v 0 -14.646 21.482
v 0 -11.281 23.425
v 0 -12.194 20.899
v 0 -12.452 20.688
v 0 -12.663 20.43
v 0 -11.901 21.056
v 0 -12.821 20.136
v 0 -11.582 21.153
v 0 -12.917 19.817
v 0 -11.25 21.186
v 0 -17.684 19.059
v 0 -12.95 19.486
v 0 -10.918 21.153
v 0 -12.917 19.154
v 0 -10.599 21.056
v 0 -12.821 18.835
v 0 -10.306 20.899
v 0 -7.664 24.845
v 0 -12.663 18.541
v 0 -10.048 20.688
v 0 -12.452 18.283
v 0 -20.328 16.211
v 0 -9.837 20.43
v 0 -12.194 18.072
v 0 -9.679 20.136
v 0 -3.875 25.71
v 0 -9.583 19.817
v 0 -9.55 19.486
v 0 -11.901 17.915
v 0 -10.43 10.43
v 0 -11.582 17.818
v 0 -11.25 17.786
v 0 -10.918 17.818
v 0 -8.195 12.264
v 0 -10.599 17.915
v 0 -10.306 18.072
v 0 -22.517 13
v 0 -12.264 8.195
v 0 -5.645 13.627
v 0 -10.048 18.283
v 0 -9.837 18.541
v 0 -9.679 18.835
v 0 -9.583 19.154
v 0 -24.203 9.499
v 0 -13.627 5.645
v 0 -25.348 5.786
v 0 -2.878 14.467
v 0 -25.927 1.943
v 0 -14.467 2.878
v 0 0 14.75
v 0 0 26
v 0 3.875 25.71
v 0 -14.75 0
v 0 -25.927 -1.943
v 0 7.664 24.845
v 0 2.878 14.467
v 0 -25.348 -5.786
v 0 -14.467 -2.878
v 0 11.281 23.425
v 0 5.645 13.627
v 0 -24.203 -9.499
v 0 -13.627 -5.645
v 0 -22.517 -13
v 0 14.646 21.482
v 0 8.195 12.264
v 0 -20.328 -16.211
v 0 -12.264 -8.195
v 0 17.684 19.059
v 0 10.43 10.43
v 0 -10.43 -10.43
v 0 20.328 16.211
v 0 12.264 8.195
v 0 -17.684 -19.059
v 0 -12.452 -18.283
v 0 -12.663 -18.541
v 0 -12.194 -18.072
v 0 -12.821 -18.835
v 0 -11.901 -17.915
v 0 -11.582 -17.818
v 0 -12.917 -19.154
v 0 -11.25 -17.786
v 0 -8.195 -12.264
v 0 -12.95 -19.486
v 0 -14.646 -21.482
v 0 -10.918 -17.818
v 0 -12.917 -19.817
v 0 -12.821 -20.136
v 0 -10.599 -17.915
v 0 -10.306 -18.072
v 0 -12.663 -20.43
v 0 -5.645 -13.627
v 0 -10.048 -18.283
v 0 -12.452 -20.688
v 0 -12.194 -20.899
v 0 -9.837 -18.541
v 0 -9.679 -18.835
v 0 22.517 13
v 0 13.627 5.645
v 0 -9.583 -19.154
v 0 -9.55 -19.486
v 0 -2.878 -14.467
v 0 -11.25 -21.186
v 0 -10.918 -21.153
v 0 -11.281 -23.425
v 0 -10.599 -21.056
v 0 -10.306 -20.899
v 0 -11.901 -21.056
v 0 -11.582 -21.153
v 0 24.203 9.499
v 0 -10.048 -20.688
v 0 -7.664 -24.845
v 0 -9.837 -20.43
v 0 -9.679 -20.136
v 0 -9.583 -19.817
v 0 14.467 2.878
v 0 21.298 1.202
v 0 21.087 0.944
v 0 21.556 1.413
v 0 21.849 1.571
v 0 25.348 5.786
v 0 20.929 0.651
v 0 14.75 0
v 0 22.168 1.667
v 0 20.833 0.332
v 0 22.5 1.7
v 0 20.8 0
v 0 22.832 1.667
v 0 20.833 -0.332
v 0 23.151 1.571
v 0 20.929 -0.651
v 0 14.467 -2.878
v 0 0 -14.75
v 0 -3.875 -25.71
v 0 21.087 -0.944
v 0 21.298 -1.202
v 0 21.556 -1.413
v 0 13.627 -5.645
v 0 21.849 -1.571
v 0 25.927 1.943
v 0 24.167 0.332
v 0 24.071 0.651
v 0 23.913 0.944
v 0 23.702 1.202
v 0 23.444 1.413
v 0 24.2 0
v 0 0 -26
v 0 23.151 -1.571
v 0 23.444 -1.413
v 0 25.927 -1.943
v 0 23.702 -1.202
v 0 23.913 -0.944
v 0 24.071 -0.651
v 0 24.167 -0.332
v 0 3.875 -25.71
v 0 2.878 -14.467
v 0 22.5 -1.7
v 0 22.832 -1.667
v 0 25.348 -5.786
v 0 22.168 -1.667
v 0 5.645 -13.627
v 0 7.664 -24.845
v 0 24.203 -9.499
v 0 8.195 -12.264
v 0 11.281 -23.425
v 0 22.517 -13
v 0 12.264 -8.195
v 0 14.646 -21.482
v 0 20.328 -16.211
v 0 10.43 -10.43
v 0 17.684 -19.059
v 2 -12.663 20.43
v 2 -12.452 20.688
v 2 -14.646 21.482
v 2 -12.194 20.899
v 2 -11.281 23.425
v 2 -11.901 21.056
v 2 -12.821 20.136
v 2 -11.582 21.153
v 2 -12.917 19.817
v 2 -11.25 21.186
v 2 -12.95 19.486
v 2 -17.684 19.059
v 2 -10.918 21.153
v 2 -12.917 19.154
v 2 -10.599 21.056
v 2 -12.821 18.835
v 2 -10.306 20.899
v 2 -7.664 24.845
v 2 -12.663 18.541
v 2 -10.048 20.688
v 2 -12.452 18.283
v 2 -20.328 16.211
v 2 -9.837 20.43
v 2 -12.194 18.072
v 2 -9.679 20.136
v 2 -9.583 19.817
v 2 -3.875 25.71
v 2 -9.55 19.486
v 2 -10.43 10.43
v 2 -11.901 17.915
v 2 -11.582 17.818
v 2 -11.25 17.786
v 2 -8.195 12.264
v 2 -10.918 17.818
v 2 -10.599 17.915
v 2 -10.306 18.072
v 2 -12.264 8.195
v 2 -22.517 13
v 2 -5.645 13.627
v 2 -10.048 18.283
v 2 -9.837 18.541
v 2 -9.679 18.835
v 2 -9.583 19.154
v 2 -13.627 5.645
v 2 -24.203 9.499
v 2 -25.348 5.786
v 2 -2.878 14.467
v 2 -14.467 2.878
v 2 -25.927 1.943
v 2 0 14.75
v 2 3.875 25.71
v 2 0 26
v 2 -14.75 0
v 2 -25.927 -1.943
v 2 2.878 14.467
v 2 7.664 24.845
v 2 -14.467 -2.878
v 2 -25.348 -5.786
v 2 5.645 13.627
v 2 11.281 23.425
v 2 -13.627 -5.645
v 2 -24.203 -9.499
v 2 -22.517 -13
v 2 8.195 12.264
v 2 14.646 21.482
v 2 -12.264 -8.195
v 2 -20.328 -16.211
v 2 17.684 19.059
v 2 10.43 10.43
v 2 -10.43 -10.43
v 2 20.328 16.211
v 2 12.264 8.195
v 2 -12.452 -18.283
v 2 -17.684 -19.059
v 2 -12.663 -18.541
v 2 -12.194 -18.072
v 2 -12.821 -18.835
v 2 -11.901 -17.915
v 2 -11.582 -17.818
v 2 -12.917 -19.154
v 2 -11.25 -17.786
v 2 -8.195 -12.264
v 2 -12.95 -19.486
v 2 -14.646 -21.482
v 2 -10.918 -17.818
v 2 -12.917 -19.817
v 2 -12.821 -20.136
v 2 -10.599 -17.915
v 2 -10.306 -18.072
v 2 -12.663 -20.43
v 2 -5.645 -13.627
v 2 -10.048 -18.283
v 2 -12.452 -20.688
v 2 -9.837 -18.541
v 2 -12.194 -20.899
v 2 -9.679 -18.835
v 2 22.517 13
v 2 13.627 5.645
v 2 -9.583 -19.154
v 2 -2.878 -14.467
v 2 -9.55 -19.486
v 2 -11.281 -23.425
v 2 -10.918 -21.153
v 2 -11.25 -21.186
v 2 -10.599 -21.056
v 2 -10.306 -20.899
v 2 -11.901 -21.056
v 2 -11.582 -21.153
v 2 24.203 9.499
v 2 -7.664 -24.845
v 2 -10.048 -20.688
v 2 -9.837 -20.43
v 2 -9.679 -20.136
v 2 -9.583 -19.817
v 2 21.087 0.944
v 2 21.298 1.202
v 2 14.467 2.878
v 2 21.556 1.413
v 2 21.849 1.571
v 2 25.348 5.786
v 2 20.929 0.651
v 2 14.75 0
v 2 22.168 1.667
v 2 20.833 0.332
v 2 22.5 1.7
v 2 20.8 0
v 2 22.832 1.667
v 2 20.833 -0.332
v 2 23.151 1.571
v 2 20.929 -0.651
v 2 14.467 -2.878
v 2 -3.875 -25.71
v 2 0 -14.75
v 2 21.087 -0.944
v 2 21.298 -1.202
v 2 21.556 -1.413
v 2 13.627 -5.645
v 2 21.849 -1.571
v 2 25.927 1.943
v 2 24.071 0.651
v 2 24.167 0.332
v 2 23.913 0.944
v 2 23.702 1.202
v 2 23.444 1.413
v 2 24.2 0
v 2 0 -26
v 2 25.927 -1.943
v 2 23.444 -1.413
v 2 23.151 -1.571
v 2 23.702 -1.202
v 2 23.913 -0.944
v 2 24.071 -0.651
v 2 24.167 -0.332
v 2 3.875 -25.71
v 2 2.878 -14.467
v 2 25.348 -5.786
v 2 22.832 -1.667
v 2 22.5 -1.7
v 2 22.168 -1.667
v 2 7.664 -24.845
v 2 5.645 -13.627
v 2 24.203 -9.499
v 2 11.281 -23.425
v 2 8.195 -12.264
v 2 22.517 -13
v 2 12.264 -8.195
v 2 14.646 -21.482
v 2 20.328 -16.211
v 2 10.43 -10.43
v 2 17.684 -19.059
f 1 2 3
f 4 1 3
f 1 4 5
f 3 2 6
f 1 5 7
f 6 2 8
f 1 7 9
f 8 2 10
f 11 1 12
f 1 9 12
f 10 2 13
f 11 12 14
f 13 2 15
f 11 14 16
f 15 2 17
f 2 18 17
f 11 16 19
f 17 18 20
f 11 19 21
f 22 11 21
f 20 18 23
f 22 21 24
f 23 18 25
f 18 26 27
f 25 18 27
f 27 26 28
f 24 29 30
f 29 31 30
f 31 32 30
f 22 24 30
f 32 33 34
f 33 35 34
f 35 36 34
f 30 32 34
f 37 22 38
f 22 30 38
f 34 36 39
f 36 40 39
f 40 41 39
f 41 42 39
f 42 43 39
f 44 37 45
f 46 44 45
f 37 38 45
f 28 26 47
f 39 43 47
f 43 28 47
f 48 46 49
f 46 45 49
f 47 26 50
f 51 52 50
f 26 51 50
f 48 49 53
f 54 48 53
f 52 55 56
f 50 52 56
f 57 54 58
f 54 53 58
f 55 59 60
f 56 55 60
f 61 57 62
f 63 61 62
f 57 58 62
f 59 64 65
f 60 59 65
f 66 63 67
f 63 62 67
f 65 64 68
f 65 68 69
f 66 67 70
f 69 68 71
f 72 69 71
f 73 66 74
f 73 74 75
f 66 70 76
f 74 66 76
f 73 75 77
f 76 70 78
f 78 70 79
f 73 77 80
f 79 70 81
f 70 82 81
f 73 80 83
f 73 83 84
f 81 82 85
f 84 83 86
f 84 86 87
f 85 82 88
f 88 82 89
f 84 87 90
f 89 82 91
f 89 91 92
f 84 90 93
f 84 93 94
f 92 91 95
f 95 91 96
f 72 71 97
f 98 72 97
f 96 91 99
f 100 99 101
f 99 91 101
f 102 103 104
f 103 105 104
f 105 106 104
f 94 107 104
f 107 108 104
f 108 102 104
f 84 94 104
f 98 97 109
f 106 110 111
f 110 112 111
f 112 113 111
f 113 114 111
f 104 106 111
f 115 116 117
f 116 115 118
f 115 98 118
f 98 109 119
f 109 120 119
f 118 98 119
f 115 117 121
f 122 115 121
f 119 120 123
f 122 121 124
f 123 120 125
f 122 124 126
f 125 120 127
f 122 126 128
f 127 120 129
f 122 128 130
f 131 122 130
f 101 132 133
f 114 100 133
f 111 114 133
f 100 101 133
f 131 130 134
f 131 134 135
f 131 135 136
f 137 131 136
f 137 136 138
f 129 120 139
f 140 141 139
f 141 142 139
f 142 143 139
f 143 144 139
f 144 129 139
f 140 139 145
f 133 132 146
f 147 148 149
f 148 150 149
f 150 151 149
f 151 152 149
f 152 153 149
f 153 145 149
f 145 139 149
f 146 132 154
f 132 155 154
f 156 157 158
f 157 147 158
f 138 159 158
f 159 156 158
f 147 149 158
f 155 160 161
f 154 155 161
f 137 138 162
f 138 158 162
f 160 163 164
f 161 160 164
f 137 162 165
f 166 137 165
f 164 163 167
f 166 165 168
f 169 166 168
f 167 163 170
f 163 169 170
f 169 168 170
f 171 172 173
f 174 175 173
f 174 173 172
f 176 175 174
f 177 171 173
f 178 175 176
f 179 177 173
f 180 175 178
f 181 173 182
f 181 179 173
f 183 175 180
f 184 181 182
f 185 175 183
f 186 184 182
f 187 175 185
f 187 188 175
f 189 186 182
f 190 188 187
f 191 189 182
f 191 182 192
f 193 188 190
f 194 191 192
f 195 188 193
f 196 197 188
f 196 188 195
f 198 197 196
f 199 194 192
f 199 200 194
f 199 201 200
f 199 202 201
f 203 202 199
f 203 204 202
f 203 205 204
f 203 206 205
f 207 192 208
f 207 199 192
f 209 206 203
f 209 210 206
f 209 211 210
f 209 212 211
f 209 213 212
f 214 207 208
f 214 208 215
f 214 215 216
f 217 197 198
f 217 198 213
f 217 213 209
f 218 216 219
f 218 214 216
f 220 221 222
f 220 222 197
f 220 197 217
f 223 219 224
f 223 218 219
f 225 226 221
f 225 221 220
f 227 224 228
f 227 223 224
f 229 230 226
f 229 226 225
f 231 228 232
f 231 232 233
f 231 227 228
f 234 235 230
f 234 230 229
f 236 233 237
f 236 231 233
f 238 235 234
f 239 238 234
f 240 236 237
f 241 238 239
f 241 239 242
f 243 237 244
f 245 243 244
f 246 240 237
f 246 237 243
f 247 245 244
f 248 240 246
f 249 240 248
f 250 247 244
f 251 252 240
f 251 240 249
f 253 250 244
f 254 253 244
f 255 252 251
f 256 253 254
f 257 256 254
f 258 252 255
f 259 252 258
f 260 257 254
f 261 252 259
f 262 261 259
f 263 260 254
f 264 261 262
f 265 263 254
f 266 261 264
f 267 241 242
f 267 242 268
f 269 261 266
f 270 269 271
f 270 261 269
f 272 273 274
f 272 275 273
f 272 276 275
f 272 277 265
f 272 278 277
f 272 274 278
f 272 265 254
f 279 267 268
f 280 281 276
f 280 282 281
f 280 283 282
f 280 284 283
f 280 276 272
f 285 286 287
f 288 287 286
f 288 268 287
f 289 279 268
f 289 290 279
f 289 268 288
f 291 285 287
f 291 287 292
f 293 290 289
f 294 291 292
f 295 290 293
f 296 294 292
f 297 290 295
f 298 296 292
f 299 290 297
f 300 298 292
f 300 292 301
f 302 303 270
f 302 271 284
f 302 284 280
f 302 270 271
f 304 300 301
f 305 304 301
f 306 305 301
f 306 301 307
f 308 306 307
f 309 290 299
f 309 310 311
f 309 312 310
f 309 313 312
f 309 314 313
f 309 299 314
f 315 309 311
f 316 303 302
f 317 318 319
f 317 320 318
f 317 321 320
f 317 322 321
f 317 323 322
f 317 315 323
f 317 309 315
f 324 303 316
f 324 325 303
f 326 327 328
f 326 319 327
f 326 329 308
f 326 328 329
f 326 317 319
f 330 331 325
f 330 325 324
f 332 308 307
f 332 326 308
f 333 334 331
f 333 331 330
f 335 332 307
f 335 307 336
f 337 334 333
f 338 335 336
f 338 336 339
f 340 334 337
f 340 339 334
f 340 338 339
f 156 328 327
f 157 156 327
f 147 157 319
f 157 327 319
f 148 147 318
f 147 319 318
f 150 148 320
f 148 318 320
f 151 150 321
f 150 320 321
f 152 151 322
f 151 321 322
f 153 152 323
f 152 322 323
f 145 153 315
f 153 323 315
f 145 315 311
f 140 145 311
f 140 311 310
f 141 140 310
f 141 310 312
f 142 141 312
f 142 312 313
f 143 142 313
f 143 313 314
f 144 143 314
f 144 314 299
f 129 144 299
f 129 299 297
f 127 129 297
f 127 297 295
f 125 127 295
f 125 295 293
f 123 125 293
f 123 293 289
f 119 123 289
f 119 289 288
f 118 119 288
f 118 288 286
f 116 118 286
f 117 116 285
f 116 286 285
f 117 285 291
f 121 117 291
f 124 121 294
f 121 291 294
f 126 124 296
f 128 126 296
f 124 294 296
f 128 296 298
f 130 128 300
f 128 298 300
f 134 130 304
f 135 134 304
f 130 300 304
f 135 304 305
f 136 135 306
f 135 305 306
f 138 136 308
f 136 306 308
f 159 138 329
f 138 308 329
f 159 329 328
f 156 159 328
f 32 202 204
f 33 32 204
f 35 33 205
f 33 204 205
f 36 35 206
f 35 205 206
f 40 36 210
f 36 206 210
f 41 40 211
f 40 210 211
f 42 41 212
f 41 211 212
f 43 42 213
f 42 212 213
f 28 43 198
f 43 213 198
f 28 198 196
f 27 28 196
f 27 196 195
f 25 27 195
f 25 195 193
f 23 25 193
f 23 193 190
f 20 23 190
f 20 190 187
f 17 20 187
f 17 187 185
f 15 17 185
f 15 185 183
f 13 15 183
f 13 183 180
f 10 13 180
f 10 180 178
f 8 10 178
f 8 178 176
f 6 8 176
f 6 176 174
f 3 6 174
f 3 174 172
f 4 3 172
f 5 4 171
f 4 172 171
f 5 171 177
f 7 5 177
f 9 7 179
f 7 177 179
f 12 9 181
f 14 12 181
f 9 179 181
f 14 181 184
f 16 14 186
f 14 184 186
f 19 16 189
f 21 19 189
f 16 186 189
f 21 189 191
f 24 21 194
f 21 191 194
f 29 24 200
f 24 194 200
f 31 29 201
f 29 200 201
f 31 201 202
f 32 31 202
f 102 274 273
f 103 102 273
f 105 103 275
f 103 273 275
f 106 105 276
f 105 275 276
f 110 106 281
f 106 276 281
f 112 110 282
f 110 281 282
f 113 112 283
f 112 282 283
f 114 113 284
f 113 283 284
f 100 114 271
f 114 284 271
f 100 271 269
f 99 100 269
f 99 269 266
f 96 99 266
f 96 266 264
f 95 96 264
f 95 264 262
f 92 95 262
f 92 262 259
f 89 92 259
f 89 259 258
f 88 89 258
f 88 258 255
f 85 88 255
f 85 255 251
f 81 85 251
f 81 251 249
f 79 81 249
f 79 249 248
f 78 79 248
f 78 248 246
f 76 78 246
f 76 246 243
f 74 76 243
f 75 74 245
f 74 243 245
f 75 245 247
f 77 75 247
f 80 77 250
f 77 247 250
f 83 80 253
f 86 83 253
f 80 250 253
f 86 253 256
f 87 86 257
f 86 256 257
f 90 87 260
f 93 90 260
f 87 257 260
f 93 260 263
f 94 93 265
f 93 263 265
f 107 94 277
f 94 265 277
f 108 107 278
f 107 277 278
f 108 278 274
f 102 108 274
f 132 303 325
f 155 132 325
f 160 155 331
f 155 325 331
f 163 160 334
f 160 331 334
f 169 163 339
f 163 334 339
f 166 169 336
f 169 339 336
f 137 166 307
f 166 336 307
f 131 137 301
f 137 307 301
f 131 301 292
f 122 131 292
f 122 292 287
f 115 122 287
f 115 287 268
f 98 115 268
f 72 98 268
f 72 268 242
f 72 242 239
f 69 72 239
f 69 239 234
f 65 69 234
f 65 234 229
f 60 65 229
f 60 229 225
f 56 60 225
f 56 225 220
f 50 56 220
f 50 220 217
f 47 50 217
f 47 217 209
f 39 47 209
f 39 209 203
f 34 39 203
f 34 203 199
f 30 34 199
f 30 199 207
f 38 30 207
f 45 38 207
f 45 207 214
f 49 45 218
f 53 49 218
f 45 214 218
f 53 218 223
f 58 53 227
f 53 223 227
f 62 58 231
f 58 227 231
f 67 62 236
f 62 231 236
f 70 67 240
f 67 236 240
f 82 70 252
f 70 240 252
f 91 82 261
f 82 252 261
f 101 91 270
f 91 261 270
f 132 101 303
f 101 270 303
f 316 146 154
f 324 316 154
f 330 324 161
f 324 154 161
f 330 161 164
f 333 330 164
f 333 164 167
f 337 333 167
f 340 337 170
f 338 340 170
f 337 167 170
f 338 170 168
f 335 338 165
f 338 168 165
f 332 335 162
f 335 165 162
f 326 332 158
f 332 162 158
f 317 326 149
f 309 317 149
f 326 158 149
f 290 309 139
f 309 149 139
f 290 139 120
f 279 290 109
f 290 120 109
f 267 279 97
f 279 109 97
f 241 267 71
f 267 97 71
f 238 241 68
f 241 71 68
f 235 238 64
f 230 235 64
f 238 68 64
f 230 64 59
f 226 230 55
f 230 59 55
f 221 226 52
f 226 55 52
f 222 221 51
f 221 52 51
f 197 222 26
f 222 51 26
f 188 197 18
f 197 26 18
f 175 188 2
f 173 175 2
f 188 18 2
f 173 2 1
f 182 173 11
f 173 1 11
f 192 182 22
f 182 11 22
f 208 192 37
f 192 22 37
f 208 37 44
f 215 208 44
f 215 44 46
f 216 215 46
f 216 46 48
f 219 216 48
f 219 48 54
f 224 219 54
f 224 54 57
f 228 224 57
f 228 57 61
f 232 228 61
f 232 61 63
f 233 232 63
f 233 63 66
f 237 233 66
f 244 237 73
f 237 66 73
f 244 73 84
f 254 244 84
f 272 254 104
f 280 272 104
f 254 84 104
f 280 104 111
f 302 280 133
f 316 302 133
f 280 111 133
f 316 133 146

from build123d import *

# Parameters (mm, degrees)
SKETCH1_R           = 26
BOSS_EXTRUDE1_DEPTH = 2
SKETCH2_R           = 14.75
CUT_EXTRUDE1_DEPTH  = 37.823905279
SKETCH3_R           = 1.7
CUT_EXTRUDE2_DEPTH  = 37.823905279


with BuildPart() as part:
    # Sketch1 → Boss-Extrude1 (new body)
    with BuildSketch(Plane.YZ):
        with Locations(Location((0, 0, 0), (0, 0, 270))):
            Circle(SKETCH1_R)
    extrude(amount=BOSS_EXTRUDE1_DEPTH)

    # Sketch2 → Cut-Extrude1 (cut, through all)
    with BuildSketch(Plane.YZ.offset(2)):
        with Locations(Location((0, 0, 0), (0, 0, 270))):
            Circle(SKETCH2_R)
    extrude(amount=-CUT_EXTRUDE1_DEPTH, mode=Mode.SUBTRACT)

    # Sketch3 → Cut-Extrude2 (cut, through all)
    with BuildSketch(Plane.YZ.offset(2)):
        with Locations(Location((22.5, 0, 0), (0, 0, 270))):
            Circle(SKETCH3_R)
        with Locations(Location((-11.25, -19.485571585, 0), (0, 0, 270))):
            Circle(SKETCH3_R)
        with Locations(Location((-11.25, 19.485571585, 0), (0, 0, 270))):
            Circle(SKETCH3_R)
    extrude(amount=-CUT_EXTRUDE2_DEPTH, mode=Mode.SUBTRACT)


solid = part.part
